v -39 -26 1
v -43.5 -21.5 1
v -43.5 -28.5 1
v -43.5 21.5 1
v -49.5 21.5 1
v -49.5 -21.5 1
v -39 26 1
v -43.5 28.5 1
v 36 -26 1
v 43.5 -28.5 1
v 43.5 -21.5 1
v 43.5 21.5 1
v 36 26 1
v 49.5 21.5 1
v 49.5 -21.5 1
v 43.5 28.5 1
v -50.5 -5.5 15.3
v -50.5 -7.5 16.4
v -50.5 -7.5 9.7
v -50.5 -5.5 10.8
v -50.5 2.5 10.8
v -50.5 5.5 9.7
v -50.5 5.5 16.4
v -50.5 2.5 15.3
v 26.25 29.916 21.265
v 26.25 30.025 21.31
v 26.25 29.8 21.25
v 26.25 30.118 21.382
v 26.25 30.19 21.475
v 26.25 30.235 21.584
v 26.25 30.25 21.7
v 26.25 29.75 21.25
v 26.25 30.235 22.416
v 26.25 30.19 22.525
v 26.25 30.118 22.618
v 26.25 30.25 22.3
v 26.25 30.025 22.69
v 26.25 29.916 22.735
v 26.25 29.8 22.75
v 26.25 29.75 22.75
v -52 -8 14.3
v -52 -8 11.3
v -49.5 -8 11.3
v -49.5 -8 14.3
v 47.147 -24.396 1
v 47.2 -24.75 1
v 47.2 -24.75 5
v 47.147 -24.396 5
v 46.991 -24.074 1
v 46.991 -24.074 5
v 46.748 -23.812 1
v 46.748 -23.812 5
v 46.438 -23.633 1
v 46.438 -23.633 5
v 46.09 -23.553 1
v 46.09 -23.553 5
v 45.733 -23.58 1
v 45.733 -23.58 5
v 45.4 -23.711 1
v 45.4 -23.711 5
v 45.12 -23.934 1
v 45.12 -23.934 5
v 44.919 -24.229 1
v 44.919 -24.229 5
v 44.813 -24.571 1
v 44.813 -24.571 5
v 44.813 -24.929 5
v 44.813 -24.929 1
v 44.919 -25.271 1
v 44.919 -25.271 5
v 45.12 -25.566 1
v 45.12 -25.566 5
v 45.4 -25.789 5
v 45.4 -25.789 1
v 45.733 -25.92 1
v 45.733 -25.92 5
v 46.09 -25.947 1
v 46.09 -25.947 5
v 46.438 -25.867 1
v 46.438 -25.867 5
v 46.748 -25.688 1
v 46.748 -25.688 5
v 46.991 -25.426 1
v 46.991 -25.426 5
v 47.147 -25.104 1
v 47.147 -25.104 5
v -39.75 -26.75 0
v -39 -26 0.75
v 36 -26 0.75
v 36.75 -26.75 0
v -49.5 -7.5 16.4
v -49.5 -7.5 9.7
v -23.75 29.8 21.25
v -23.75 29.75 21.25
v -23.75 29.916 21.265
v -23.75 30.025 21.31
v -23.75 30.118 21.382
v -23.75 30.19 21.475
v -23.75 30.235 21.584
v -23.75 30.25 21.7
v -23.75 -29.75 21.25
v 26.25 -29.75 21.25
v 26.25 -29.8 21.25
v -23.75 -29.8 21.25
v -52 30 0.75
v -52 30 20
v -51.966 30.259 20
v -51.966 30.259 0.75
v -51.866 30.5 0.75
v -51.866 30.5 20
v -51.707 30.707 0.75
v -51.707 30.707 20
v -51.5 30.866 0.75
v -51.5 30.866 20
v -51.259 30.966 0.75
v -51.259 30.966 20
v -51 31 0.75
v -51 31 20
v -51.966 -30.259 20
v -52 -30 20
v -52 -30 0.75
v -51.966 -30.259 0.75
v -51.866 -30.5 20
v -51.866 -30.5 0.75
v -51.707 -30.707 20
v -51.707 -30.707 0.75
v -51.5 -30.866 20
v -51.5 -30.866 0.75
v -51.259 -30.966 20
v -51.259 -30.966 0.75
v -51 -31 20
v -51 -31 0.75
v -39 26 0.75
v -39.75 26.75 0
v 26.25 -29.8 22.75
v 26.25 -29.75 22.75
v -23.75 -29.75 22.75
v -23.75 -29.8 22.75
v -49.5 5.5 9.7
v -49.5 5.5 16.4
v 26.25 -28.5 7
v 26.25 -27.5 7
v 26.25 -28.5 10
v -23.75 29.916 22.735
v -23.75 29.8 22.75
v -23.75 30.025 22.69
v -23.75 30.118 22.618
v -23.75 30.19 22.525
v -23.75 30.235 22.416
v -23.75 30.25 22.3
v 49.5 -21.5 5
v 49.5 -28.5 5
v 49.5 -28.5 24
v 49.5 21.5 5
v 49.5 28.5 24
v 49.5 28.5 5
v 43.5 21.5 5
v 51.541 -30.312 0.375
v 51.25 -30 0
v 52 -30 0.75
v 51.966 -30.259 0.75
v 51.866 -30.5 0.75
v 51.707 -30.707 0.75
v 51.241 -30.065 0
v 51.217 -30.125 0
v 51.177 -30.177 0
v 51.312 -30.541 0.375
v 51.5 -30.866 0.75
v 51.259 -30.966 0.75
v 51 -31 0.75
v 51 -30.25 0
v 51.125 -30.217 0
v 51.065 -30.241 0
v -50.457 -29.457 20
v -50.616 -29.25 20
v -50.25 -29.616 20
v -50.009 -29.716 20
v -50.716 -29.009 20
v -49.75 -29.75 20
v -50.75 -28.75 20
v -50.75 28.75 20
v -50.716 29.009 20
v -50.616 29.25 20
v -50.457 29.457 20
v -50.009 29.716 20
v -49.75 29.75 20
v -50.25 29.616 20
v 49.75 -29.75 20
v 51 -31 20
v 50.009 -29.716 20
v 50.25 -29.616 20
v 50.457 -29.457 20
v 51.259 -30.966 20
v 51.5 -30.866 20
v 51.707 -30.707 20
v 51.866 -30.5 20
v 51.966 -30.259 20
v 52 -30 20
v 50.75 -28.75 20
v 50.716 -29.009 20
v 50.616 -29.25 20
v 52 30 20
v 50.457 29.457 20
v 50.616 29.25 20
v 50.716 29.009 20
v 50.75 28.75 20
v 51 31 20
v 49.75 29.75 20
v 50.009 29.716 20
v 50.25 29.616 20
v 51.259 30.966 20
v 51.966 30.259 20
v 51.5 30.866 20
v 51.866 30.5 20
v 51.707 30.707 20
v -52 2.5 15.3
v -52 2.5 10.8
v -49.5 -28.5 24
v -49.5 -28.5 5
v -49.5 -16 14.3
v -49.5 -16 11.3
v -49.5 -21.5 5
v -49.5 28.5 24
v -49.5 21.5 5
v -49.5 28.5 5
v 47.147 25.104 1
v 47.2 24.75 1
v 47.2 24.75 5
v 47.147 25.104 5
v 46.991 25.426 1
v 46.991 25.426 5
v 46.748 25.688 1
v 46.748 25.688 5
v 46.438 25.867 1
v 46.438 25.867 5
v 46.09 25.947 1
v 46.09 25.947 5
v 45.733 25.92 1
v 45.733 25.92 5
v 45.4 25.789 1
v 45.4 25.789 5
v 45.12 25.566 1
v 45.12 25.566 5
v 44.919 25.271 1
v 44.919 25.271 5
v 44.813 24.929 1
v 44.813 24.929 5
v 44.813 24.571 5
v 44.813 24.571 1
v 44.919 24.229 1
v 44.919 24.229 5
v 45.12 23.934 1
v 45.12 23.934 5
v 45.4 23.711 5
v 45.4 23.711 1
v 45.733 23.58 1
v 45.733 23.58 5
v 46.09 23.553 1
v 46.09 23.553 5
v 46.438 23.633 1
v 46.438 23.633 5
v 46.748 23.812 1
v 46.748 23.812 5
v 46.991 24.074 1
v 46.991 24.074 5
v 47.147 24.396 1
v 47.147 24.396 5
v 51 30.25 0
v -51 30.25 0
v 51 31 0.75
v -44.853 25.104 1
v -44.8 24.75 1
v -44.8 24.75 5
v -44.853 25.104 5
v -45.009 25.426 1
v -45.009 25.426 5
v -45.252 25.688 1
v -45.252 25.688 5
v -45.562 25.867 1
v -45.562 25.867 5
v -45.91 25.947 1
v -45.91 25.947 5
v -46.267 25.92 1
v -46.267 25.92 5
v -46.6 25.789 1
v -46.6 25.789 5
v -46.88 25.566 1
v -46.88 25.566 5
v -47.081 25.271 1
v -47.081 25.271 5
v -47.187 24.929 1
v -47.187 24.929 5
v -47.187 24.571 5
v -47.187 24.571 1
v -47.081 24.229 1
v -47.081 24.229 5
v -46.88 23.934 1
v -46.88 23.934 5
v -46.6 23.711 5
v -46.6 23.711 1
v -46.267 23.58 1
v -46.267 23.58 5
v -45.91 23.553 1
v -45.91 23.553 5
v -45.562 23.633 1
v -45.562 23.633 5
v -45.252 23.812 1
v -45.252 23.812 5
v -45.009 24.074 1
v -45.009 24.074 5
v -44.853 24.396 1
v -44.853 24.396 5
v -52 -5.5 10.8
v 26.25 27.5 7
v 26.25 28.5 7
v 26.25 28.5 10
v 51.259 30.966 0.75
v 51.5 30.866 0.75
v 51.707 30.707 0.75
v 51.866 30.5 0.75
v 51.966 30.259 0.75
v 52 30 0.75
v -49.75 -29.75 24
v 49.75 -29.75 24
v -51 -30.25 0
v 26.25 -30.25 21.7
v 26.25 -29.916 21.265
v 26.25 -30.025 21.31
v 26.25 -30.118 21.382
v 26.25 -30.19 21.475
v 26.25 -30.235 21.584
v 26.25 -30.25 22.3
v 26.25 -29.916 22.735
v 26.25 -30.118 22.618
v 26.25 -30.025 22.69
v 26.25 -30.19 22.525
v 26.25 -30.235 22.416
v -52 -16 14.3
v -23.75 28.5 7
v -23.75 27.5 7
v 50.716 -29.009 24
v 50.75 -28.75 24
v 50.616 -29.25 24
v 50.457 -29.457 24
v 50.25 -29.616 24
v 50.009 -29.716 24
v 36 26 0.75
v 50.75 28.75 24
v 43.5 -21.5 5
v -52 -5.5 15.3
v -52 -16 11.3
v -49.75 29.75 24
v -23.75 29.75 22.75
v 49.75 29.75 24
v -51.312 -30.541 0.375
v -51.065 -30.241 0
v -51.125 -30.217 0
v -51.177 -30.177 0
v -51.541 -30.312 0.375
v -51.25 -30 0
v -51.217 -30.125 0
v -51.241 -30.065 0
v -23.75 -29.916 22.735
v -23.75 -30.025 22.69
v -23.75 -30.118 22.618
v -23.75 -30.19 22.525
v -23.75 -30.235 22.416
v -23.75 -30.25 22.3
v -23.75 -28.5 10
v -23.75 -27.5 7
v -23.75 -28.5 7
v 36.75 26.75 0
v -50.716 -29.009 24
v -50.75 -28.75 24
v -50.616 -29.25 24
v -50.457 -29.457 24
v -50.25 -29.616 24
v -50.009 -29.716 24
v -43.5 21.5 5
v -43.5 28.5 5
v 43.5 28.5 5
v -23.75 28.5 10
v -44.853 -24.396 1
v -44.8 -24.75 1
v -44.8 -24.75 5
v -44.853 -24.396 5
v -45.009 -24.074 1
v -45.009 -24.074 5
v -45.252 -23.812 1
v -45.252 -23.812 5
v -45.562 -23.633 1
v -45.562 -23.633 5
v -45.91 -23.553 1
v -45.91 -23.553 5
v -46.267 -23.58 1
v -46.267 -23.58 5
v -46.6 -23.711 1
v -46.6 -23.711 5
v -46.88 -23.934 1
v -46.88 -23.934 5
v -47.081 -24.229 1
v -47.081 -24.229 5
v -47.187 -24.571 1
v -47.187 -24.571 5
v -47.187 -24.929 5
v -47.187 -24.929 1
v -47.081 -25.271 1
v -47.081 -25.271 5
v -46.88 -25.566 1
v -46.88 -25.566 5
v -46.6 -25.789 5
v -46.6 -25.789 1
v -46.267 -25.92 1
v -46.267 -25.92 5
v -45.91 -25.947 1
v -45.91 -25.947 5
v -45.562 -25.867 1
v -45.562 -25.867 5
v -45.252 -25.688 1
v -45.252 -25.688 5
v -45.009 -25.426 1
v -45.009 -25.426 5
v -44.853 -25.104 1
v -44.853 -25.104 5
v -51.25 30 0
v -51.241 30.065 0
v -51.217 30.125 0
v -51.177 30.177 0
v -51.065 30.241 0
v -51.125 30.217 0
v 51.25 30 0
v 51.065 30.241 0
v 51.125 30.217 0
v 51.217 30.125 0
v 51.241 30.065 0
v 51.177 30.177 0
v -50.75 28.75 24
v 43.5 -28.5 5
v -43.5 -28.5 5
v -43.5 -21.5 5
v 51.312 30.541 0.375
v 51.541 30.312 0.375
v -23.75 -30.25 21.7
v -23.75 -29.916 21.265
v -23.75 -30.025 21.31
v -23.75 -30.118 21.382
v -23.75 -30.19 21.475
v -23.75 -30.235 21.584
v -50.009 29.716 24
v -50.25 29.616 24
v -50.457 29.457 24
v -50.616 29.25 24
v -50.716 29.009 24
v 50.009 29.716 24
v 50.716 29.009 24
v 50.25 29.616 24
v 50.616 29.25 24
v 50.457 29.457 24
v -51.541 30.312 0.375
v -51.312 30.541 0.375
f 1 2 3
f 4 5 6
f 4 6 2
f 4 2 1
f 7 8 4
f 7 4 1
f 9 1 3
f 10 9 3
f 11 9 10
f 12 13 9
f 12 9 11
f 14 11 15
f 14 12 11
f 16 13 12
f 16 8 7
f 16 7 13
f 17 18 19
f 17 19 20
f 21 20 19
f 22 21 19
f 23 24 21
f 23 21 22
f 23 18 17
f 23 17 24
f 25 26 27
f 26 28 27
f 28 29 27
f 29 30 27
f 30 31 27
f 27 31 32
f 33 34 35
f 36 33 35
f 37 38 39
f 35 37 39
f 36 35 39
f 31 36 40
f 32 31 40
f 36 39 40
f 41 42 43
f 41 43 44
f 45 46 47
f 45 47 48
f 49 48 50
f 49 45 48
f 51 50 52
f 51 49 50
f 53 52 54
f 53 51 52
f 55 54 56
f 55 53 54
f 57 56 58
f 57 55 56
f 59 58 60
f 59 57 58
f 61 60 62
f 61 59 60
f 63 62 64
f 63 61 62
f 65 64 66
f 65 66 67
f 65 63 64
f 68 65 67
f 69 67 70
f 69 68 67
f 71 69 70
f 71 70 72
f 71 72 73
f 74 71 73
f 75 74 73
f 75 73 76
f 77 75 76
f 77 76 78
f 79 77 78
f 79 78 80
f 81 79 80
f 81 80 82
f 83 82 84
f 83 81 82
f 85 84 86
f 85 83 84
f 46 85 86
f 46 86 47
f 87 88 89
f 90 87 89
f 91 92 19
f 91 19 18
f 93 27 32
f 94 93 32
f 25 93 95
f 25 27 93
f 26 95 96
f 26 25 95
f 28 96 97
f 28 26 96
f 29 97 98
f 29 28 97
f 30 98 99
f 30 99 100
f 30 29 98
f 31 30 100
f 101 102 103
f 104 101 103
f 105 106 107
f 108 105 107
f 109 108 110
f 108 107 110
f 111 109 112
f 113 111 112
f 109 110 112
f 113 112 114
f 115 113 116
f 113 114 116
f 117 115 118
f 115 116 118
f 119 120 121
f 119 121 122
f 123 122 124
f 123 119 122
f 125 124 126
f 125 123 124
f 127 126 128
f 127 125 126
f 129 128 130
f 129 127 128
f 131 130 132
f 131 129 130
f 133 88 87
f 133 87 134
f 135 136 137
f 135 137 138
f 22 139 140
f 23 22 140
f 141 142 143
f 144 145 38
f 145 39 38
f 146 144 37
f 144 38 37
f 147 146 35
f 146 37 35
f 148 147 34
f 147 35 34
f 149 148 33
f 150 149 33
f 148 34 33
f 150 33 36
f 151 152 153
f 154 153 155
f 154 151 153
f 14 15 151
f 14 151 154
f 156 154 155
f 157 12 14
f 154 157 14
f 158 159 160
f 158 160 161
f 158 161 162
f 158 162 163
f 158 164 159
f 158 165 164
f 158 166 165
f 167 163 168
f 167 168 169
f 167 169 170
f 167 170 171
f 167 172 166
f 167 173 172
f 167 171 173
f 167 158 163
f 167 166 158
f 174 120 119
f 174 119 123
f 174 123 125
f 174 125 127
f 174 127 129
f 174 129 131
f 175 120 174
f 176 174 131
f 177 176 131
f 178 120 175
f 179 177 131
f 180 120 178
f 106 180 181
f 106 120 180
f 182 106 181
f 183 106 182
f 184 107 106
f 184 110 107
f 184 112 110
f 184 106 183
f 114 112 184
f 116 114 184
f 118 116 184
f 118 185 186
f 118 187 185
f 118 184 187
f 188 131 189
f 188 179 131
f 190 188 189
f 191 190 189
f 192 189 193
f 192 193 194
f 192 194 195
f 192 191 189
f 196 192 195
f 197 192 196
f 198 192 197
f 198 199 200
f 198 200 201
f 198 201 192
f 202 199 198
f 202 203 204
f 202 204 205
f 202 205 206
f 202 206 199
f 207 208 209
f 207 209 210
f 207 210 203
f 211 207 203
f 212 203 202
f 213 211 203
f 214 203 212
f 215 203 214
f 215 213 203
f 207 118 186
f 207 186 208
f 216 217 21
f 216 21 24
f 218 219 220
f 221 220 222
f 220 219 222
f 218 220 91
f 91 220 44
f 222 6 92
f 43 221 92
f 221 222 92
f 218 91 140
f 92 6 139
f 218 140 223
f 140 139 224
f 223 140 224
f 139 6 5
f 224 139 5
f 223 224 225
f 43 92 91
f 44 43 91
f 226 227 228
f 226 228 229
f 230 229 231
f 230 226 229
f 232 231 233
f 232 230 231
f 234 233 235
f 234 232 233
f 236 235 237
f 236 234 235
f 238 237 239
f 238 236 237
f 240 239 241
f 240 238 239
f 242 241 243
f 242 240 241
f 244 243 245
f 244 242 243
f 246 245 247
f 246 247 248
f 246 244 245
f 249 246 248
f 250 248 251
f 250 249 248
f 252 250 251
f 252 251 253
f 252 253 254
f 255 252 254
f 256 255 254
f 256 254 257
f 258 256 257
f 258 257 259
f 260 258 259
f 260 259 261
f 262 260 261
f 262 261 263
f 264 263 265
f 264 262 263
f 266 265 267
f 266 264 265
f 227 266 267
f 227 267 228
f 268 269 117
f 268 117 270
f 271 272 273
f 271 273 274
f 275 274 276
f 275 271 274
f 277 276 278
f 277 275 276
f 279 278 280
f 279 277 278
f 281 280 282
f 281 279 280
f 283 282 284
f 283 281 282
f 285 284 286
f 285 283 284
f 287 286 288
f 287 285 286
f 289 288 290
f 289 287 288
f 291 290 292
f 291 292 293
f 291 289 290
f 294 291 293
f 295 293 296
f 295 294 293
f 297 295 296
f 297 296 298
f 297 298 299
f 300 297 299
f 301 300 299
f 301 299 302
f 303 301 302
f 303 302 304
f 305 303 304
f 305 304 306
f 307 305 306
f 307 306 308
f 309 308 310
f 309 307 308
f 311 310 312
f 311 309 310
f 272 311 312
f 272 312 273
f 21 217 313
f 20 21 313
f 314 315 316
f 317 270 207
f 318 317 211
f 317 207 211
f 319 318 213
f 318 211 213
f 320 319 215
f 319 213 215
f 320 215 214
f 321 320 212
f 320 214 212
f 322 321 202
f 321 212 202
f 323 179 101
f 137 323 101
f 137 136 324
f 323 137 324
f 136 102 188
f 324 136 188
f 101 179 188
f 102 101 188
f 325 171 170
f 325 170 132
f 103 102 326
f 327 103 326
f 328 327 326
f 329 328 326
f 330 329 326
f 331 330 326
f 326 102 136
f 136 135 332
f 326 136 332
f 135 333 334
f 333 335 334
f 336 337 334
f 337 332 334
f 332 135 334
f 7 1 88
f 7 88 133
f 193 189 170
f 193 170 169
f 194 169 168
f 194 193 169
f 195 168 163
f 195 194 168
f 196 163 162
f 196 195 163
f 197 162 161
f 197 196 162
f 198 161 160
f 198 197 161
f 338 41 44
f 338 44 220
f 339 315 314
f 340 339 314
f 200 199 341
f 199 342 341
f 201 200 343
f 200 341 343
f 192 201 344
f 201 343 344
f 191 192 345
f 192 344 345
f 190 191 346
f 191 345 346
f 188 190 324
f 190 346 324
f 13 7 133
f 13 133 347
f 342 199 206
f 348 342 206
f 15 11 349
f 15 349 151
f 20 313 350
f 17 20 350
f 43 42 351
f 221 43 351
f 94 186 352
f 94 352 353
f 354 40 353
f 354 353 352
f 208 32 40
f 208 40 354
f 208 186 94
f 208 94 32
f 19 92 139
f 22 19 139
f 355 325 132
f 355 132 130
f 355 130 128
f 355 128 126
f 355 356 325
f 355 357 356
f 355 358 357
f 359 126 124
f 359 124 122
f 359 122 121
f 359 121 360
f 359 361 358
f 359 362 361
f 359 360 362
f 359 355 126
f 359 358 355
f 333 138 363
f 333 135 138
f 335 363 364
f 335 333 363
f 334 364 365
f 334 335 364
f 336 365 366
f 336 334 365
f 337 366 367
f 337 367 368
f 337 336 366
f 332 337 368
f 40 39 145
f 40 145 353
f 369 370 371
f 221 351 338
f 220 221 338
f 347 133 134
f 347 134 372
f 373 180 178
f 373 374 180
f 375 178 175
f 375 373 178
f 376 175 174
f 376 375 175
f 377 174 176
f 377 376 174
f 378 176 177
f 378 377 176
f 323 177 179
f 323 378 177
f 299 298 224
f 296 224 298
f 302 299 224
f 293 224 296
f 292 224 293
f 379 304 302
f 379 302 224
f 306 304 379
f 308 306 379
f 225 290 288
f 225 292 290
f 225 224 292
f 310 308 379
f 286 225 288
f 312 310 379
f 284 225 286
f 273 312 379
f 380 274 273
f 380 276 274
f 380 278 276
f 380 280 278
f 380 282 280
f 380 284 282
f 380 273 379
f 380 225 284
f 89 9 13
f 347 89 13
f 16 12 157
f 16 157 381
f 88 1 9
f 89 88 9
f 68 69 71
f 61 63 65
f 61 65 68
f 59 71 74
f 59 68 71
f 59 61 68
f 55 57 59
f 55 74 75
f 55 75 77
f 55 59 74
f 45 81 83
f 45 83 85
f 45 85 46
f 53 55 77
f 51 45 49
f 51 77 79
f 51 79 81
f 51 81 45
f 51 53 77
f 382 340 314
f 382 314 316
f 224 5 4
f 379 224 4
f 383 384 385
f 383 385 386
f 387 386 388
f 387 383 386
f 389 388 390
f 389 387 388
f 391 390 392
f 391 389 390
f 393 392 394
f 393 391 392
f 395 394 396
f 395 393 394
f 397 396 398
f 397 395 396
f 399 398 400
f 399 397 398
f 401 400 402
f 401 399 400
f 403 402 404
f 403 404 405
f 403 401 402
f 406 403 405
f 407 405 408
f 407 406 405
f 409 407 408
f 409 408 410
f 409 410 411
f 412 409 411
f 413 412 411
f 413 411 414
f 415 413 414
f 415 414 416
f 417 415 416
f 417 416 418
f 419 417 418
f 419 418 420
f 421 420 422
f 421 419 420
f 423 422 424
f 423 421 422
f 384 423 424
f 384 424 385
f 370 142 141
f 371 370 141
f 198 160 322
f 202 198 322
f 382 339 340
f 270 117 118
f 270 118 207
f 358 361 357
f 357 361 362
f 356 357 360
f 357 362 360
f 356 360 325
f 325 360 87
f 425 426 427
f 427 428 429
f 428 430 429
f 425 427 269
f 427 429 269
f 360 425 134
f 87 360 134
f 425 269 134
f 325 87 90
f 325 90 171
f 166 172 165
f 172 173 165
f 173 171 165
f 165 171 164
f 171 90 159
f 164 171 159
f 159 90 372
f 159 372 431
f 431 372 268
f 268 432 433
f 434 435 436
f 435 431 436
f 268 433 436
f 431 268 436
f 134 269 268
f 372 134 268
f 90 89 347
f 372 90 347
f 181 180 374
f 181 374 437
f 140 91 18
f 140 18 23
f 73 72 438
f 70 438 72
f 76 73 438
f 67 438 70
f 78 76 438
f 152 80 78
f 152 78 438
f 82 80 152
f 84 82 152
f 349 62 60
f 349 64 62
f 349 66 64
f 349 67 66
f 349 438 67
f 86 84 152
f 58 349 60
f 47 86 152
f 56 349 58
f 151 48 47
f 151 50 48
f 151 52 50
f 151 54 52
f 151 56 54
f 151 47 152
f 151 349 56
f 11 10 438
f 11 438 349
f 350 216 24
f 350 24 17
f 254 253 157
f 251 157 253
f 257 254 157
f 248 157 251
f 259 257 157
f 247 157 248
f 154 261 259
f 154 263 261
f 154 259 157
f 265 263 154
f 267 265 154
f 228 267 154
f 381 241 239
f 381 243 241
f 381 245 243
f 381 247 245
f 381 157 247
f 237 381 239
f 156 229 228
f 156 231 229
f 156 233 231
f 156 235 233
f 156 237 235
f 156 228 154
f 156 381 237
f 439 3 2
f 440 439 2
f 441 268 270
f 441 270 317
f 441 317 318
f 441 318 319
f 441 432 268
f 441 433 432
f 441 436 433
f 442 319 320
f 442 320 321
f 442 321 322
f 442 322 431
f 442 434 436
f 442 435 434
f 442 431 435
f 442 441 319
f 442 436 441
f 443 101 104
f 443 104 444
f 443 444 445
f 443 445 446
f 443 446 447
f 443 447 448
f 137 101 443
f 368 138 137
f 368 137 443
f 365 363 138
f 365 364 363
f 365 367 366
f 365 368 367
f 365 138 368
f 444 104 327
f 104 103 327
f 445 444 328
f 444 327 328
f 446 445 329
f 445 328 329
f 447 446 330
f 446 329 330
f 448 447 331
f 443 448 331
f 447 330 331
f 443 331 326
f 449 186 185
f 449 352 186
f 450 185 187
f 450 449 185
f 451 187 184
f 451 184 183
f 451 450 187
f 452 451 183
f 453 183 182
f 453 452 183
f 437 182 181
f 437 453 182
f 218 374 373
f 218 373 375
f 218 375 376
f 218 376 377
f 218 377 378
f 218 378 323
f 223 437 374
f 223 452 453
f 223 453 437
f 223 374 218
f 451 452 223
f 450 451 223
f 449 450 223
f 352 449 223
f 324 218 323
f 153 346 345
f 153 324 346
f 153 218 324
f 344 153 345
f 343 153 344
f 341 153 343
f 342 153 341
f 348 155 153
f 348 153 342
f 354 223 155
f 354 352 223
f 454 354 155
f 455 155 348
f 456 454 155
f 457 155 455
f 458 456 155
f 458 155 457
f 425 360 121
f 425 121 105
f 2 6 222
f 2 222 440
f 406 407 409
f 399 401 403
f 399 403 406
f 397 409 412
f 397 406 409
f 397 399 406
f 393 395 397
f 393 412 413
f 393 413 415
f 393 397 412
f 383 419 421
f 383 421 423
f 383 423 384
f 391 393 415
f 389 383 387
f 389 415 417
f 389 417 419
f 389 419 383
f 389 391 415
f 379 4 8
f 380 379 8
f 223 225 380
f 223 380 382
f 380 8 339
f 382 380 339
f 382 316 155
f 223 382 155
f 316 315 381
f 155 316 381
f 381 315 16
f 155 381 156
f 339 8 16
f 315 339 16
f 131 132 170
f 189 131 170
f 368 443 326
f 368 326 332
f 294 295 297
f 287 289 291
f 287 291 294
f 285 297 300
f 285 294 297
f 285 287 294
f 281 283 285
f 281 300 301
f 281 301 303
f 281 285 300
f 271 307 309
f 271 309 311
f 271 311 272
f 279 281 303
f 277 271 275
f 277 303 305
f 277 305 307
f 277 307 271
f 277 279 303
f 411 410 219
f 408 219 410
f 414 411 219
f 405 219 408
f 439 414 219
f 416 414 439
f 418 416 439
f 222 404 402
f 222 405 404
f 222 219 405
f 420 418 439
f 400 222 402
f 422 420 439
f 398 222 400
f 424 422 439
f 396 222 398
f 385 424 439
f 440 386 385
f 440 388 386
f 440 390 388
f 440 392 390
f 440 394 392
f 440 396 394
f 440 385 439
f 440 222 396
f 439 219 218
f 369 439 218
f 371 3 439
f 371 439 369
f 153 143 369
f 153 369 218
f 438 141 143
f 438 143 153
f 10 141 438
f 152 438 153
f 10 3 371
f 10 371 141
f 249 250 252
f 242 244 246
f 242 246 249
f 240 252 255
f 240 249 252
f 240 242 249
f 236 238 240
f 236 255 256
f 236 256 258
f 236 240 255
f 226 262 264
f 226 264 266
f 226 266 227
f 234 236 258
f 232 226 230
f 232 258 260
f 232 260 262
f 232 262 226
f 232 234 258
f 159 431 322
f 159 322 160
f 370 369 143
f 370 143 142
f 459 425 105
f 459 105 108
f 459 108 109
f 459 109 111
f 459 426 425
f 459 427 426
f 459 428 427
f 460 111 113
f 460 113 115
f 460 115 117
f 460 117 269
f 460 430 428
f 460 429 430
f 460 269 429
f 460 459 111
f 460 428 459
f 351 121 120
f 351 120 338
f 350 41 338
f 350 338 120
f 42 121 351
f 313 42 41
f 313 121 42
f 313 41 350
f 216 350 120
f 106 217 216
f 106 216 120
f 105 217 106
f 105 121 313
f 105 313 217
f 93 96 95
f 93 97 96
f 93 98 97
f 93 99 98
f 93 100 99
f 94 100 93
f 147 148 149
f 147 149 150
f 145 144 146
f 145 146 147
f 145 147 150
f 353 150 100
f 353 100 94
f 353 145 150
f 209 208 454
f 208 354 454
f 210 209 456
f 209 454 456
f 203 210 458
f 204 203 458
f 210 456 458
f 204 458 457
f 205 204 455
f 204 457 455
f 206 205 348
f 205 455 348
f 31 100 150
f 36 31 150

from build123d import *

# Parameters (mm, degrees)
SKETCH_W        = 104
SKETCH_H        = 62
PAD_DEPTH       = 20
SKETCH001_W     = 99
SKETCH001_H     = 57
POCKET_DEPTH    = 19
SKETCH002_W     = 6
SKETCH002_H     = 7
SKETCH002_R     = 1.2
PAD001_DEPTH    = 4
SKETCH003_W     = 75
SKETCH003_H     = 52
POCKET001_DEPTH = 1
SKETCH004_W     = 101.5
SKETCH004_H     = 59.5
SKETCH004_W_2   = 99
SKETCH004_H_2   = 57
PAD002_DEPTH    = 4
SKETCH005_W     = 0.5
SKETCH005_H     = 1.5
PAD003_DEPTH    = 50
FILLET_R        = 0.45
FILLET001_R     = 0.45
FILLET002_R     = 1
CHAMFER_SIZE    = 0.75
CHAMFER001_SIZE = 0.75
SKETCH006_W     = 8
SKETCH006_H     = 3
SKETCH006_H_2   = 4.5
POCKET002_DEPTH = 2.5
SKETCH009_W     = 13
SKETCH009_H     = 6.7
POCKET003_DEPTH = 1


with BuildPart() as part:
    # Sketch → Pad (new body)
    with BuildSketch(Plane.XY):
        Rectangle(SKETCH_W, SKETCH_H)
    extrude(amount=PAD_DEPTH)

    # Sketch001 (on Face6 of Pad) → Pocket (cut)
    with BuildSketch(Plane.XY.offset(20)):
        Rectangle(SKETCH001_W, SKETCH001_H)
    extrude(amount=-POCKET_DEPTH, mode=Mode.SUBTRACT)

    # Sketch002 (on Face11 of Pocket) → Pad001 (join)
    with BuildSketch(Plane.XY.offset(1)):
        with Locations((-46.5, 25)):
            Rectangle(SKETCH002_W, SKETCH002_H)
        with Locations((-46, 24.75)):
            Circle(SKETCH002_R, mode=Mode.SUBTRACT)
        with Locations((46.5, 25)):
            Rectangle(SKETCH002_W, SKETCH002_H)
        with Locations((46, 24.75)):
            Circle(SKETCH002_R, mode=Mode.SUBTRACT)
        with Locations((-46.5, -25)):
            Rectangle(SKETCH002_W, SKETCH002_H)
        with Locations((-46, -24.75)):
            Circle(SKETCH002_R, mode=Mode.SUBTRACT)
        with Locations((46.5, -25)):
            Rectangle(SKETCH002_W, SKETCH002_H)
        with Locations((46, -24.75)):
            Circle(SKETCH002_R, mode=Mode.SUBTRACT)
    extrude(amount=PAD001_DEPTH)

    # Sketch003 (on Face13 of Pad001) → Pocket001 (cut)
    with BuildSketch(Plane.XY.offset(1)):
        with Locations((-1.5, 0)):
            Rectangle(SKETCH003_W, SKETCH003_H)
    extrude(amount=-POCKET001_DEPTH, mode=Mode.SUBTRACT)

    # Sketch004 (on Face5 of Pocket001) → Pad002 (join)
    with BuildSketch(Plane.XY.offset(20)):
        Rectangle(SKETCH004_W, SKETCH004_H)
        Rectangle(SKETCH004_W_2, SKETCH004_H_2, mode=Mode.SUBTRACT)
    extrude(amount=PAD002_DEPTH)

    # Sketch005 (on Face14 of Pad002) → Pad003 (join)
    with BuildSketch(Plane(origin=(-23.75, 0, 0), x_dir=(0, -1, 0), z_dir=(-1, 0, 0))):
        with Locations((-30, 22)):
            Rectangle(SKETCH005_W, SKETCH005_H)
        with Locations((30, 22)):
            Rectangle(SKETCH005_W, SKETCH005_H)
        Polygon((-28.5, 7), (-27.5, 7), (-28.5, 10), align=None)
        Polygon((28.5, 7), (28.5, 10), (27.5, 7), align=None)
    extrude(amount=-PAD003_DEPTH)

    # Fillet
    fillet_edges = [part.edges().sort_by_distance(p)[0] for p in [
        (1.25, -30.25, 22.75),
        (1.25, -30.25, 21.25),
    ]]
    fillet(fillet_edges, radius=FILLET_R)

    # Fillet001
    fillet001_edges = [part.edges().sort_by_distance(p)[0] for p in [
        (1.25, 30.25, 22.75),
        (1.25, 30.25, 21.25),
    ]]
    fillet(fillet001_edges, radius=FILLET001_R)

    # Fillet002
    fillet002_edges = [part.edges().sort_by_distance(p)[0] for p in [
        (-50.75, -29.75, 22),
        (-52, -31, 10),
        (-50.75, 29.75, 22),
        (-52, 31, 10),
        (50.75, 29.75, 22),
        (52, 31, 10),
        (50.75, -29.75, 22),
        (52, -31, 10),
    ]]
    fillet(fillet002_edges, radius=FILLET002_R)

    # Chamfer
    chamfer_edges = [part.edges().sort_by_distance(p)[0] for p in [
        (-52, 0, 0),
        (0, -31, 0),
        (52, 0, 0),
        (0, 31, 0),
    ]]
    chamfer(chamfer_edges, length=CHAMFER_SIZE)

    # Chamfer001
    chamfer001_edges = [part.edges().sort_by_distance(p)[0] for p in [
        (-39, 0, 0),
        (-1.5, -26, 0),
        (36, 0, 0),
        (-1.5, 26, 0),
    ]]
    chamfer(chamfer001_edges, length=CHAMFER001_SIZE)

    # Sketch006 (on Face2 of Pad003) → Pocket002 (cut)
    with BuildSketch(Plane(origin=(-52, 0, 0), x_dir=(0, -1, 0), z_dir=(-1, 0, 0))):
        with Locations((12, 12.8)):
            Rectangle(SKETCH006_W, SKETCH006_H)
        with Locations((1.5, 13.05)):
            Rectangle(SKETCH006_W, SKETCH006_H_2)
    extrude(amount=-POCKET002_DEPTH, mode=Mode.SUBTRACT)

    # Sketch009 (on Face40 of Pocket002) → Pocket003 (cut)
    with BuildSketch(Plane.YZ.offset(-49.5)):
        with Locations((-1, 13.05)):
            Rectangle(SKETCH009_W, SKETCH009_H)
    extrude(amount=-POCKET003_DEPTH, mode=Mode.SUBTRACT)


solid = part.part
